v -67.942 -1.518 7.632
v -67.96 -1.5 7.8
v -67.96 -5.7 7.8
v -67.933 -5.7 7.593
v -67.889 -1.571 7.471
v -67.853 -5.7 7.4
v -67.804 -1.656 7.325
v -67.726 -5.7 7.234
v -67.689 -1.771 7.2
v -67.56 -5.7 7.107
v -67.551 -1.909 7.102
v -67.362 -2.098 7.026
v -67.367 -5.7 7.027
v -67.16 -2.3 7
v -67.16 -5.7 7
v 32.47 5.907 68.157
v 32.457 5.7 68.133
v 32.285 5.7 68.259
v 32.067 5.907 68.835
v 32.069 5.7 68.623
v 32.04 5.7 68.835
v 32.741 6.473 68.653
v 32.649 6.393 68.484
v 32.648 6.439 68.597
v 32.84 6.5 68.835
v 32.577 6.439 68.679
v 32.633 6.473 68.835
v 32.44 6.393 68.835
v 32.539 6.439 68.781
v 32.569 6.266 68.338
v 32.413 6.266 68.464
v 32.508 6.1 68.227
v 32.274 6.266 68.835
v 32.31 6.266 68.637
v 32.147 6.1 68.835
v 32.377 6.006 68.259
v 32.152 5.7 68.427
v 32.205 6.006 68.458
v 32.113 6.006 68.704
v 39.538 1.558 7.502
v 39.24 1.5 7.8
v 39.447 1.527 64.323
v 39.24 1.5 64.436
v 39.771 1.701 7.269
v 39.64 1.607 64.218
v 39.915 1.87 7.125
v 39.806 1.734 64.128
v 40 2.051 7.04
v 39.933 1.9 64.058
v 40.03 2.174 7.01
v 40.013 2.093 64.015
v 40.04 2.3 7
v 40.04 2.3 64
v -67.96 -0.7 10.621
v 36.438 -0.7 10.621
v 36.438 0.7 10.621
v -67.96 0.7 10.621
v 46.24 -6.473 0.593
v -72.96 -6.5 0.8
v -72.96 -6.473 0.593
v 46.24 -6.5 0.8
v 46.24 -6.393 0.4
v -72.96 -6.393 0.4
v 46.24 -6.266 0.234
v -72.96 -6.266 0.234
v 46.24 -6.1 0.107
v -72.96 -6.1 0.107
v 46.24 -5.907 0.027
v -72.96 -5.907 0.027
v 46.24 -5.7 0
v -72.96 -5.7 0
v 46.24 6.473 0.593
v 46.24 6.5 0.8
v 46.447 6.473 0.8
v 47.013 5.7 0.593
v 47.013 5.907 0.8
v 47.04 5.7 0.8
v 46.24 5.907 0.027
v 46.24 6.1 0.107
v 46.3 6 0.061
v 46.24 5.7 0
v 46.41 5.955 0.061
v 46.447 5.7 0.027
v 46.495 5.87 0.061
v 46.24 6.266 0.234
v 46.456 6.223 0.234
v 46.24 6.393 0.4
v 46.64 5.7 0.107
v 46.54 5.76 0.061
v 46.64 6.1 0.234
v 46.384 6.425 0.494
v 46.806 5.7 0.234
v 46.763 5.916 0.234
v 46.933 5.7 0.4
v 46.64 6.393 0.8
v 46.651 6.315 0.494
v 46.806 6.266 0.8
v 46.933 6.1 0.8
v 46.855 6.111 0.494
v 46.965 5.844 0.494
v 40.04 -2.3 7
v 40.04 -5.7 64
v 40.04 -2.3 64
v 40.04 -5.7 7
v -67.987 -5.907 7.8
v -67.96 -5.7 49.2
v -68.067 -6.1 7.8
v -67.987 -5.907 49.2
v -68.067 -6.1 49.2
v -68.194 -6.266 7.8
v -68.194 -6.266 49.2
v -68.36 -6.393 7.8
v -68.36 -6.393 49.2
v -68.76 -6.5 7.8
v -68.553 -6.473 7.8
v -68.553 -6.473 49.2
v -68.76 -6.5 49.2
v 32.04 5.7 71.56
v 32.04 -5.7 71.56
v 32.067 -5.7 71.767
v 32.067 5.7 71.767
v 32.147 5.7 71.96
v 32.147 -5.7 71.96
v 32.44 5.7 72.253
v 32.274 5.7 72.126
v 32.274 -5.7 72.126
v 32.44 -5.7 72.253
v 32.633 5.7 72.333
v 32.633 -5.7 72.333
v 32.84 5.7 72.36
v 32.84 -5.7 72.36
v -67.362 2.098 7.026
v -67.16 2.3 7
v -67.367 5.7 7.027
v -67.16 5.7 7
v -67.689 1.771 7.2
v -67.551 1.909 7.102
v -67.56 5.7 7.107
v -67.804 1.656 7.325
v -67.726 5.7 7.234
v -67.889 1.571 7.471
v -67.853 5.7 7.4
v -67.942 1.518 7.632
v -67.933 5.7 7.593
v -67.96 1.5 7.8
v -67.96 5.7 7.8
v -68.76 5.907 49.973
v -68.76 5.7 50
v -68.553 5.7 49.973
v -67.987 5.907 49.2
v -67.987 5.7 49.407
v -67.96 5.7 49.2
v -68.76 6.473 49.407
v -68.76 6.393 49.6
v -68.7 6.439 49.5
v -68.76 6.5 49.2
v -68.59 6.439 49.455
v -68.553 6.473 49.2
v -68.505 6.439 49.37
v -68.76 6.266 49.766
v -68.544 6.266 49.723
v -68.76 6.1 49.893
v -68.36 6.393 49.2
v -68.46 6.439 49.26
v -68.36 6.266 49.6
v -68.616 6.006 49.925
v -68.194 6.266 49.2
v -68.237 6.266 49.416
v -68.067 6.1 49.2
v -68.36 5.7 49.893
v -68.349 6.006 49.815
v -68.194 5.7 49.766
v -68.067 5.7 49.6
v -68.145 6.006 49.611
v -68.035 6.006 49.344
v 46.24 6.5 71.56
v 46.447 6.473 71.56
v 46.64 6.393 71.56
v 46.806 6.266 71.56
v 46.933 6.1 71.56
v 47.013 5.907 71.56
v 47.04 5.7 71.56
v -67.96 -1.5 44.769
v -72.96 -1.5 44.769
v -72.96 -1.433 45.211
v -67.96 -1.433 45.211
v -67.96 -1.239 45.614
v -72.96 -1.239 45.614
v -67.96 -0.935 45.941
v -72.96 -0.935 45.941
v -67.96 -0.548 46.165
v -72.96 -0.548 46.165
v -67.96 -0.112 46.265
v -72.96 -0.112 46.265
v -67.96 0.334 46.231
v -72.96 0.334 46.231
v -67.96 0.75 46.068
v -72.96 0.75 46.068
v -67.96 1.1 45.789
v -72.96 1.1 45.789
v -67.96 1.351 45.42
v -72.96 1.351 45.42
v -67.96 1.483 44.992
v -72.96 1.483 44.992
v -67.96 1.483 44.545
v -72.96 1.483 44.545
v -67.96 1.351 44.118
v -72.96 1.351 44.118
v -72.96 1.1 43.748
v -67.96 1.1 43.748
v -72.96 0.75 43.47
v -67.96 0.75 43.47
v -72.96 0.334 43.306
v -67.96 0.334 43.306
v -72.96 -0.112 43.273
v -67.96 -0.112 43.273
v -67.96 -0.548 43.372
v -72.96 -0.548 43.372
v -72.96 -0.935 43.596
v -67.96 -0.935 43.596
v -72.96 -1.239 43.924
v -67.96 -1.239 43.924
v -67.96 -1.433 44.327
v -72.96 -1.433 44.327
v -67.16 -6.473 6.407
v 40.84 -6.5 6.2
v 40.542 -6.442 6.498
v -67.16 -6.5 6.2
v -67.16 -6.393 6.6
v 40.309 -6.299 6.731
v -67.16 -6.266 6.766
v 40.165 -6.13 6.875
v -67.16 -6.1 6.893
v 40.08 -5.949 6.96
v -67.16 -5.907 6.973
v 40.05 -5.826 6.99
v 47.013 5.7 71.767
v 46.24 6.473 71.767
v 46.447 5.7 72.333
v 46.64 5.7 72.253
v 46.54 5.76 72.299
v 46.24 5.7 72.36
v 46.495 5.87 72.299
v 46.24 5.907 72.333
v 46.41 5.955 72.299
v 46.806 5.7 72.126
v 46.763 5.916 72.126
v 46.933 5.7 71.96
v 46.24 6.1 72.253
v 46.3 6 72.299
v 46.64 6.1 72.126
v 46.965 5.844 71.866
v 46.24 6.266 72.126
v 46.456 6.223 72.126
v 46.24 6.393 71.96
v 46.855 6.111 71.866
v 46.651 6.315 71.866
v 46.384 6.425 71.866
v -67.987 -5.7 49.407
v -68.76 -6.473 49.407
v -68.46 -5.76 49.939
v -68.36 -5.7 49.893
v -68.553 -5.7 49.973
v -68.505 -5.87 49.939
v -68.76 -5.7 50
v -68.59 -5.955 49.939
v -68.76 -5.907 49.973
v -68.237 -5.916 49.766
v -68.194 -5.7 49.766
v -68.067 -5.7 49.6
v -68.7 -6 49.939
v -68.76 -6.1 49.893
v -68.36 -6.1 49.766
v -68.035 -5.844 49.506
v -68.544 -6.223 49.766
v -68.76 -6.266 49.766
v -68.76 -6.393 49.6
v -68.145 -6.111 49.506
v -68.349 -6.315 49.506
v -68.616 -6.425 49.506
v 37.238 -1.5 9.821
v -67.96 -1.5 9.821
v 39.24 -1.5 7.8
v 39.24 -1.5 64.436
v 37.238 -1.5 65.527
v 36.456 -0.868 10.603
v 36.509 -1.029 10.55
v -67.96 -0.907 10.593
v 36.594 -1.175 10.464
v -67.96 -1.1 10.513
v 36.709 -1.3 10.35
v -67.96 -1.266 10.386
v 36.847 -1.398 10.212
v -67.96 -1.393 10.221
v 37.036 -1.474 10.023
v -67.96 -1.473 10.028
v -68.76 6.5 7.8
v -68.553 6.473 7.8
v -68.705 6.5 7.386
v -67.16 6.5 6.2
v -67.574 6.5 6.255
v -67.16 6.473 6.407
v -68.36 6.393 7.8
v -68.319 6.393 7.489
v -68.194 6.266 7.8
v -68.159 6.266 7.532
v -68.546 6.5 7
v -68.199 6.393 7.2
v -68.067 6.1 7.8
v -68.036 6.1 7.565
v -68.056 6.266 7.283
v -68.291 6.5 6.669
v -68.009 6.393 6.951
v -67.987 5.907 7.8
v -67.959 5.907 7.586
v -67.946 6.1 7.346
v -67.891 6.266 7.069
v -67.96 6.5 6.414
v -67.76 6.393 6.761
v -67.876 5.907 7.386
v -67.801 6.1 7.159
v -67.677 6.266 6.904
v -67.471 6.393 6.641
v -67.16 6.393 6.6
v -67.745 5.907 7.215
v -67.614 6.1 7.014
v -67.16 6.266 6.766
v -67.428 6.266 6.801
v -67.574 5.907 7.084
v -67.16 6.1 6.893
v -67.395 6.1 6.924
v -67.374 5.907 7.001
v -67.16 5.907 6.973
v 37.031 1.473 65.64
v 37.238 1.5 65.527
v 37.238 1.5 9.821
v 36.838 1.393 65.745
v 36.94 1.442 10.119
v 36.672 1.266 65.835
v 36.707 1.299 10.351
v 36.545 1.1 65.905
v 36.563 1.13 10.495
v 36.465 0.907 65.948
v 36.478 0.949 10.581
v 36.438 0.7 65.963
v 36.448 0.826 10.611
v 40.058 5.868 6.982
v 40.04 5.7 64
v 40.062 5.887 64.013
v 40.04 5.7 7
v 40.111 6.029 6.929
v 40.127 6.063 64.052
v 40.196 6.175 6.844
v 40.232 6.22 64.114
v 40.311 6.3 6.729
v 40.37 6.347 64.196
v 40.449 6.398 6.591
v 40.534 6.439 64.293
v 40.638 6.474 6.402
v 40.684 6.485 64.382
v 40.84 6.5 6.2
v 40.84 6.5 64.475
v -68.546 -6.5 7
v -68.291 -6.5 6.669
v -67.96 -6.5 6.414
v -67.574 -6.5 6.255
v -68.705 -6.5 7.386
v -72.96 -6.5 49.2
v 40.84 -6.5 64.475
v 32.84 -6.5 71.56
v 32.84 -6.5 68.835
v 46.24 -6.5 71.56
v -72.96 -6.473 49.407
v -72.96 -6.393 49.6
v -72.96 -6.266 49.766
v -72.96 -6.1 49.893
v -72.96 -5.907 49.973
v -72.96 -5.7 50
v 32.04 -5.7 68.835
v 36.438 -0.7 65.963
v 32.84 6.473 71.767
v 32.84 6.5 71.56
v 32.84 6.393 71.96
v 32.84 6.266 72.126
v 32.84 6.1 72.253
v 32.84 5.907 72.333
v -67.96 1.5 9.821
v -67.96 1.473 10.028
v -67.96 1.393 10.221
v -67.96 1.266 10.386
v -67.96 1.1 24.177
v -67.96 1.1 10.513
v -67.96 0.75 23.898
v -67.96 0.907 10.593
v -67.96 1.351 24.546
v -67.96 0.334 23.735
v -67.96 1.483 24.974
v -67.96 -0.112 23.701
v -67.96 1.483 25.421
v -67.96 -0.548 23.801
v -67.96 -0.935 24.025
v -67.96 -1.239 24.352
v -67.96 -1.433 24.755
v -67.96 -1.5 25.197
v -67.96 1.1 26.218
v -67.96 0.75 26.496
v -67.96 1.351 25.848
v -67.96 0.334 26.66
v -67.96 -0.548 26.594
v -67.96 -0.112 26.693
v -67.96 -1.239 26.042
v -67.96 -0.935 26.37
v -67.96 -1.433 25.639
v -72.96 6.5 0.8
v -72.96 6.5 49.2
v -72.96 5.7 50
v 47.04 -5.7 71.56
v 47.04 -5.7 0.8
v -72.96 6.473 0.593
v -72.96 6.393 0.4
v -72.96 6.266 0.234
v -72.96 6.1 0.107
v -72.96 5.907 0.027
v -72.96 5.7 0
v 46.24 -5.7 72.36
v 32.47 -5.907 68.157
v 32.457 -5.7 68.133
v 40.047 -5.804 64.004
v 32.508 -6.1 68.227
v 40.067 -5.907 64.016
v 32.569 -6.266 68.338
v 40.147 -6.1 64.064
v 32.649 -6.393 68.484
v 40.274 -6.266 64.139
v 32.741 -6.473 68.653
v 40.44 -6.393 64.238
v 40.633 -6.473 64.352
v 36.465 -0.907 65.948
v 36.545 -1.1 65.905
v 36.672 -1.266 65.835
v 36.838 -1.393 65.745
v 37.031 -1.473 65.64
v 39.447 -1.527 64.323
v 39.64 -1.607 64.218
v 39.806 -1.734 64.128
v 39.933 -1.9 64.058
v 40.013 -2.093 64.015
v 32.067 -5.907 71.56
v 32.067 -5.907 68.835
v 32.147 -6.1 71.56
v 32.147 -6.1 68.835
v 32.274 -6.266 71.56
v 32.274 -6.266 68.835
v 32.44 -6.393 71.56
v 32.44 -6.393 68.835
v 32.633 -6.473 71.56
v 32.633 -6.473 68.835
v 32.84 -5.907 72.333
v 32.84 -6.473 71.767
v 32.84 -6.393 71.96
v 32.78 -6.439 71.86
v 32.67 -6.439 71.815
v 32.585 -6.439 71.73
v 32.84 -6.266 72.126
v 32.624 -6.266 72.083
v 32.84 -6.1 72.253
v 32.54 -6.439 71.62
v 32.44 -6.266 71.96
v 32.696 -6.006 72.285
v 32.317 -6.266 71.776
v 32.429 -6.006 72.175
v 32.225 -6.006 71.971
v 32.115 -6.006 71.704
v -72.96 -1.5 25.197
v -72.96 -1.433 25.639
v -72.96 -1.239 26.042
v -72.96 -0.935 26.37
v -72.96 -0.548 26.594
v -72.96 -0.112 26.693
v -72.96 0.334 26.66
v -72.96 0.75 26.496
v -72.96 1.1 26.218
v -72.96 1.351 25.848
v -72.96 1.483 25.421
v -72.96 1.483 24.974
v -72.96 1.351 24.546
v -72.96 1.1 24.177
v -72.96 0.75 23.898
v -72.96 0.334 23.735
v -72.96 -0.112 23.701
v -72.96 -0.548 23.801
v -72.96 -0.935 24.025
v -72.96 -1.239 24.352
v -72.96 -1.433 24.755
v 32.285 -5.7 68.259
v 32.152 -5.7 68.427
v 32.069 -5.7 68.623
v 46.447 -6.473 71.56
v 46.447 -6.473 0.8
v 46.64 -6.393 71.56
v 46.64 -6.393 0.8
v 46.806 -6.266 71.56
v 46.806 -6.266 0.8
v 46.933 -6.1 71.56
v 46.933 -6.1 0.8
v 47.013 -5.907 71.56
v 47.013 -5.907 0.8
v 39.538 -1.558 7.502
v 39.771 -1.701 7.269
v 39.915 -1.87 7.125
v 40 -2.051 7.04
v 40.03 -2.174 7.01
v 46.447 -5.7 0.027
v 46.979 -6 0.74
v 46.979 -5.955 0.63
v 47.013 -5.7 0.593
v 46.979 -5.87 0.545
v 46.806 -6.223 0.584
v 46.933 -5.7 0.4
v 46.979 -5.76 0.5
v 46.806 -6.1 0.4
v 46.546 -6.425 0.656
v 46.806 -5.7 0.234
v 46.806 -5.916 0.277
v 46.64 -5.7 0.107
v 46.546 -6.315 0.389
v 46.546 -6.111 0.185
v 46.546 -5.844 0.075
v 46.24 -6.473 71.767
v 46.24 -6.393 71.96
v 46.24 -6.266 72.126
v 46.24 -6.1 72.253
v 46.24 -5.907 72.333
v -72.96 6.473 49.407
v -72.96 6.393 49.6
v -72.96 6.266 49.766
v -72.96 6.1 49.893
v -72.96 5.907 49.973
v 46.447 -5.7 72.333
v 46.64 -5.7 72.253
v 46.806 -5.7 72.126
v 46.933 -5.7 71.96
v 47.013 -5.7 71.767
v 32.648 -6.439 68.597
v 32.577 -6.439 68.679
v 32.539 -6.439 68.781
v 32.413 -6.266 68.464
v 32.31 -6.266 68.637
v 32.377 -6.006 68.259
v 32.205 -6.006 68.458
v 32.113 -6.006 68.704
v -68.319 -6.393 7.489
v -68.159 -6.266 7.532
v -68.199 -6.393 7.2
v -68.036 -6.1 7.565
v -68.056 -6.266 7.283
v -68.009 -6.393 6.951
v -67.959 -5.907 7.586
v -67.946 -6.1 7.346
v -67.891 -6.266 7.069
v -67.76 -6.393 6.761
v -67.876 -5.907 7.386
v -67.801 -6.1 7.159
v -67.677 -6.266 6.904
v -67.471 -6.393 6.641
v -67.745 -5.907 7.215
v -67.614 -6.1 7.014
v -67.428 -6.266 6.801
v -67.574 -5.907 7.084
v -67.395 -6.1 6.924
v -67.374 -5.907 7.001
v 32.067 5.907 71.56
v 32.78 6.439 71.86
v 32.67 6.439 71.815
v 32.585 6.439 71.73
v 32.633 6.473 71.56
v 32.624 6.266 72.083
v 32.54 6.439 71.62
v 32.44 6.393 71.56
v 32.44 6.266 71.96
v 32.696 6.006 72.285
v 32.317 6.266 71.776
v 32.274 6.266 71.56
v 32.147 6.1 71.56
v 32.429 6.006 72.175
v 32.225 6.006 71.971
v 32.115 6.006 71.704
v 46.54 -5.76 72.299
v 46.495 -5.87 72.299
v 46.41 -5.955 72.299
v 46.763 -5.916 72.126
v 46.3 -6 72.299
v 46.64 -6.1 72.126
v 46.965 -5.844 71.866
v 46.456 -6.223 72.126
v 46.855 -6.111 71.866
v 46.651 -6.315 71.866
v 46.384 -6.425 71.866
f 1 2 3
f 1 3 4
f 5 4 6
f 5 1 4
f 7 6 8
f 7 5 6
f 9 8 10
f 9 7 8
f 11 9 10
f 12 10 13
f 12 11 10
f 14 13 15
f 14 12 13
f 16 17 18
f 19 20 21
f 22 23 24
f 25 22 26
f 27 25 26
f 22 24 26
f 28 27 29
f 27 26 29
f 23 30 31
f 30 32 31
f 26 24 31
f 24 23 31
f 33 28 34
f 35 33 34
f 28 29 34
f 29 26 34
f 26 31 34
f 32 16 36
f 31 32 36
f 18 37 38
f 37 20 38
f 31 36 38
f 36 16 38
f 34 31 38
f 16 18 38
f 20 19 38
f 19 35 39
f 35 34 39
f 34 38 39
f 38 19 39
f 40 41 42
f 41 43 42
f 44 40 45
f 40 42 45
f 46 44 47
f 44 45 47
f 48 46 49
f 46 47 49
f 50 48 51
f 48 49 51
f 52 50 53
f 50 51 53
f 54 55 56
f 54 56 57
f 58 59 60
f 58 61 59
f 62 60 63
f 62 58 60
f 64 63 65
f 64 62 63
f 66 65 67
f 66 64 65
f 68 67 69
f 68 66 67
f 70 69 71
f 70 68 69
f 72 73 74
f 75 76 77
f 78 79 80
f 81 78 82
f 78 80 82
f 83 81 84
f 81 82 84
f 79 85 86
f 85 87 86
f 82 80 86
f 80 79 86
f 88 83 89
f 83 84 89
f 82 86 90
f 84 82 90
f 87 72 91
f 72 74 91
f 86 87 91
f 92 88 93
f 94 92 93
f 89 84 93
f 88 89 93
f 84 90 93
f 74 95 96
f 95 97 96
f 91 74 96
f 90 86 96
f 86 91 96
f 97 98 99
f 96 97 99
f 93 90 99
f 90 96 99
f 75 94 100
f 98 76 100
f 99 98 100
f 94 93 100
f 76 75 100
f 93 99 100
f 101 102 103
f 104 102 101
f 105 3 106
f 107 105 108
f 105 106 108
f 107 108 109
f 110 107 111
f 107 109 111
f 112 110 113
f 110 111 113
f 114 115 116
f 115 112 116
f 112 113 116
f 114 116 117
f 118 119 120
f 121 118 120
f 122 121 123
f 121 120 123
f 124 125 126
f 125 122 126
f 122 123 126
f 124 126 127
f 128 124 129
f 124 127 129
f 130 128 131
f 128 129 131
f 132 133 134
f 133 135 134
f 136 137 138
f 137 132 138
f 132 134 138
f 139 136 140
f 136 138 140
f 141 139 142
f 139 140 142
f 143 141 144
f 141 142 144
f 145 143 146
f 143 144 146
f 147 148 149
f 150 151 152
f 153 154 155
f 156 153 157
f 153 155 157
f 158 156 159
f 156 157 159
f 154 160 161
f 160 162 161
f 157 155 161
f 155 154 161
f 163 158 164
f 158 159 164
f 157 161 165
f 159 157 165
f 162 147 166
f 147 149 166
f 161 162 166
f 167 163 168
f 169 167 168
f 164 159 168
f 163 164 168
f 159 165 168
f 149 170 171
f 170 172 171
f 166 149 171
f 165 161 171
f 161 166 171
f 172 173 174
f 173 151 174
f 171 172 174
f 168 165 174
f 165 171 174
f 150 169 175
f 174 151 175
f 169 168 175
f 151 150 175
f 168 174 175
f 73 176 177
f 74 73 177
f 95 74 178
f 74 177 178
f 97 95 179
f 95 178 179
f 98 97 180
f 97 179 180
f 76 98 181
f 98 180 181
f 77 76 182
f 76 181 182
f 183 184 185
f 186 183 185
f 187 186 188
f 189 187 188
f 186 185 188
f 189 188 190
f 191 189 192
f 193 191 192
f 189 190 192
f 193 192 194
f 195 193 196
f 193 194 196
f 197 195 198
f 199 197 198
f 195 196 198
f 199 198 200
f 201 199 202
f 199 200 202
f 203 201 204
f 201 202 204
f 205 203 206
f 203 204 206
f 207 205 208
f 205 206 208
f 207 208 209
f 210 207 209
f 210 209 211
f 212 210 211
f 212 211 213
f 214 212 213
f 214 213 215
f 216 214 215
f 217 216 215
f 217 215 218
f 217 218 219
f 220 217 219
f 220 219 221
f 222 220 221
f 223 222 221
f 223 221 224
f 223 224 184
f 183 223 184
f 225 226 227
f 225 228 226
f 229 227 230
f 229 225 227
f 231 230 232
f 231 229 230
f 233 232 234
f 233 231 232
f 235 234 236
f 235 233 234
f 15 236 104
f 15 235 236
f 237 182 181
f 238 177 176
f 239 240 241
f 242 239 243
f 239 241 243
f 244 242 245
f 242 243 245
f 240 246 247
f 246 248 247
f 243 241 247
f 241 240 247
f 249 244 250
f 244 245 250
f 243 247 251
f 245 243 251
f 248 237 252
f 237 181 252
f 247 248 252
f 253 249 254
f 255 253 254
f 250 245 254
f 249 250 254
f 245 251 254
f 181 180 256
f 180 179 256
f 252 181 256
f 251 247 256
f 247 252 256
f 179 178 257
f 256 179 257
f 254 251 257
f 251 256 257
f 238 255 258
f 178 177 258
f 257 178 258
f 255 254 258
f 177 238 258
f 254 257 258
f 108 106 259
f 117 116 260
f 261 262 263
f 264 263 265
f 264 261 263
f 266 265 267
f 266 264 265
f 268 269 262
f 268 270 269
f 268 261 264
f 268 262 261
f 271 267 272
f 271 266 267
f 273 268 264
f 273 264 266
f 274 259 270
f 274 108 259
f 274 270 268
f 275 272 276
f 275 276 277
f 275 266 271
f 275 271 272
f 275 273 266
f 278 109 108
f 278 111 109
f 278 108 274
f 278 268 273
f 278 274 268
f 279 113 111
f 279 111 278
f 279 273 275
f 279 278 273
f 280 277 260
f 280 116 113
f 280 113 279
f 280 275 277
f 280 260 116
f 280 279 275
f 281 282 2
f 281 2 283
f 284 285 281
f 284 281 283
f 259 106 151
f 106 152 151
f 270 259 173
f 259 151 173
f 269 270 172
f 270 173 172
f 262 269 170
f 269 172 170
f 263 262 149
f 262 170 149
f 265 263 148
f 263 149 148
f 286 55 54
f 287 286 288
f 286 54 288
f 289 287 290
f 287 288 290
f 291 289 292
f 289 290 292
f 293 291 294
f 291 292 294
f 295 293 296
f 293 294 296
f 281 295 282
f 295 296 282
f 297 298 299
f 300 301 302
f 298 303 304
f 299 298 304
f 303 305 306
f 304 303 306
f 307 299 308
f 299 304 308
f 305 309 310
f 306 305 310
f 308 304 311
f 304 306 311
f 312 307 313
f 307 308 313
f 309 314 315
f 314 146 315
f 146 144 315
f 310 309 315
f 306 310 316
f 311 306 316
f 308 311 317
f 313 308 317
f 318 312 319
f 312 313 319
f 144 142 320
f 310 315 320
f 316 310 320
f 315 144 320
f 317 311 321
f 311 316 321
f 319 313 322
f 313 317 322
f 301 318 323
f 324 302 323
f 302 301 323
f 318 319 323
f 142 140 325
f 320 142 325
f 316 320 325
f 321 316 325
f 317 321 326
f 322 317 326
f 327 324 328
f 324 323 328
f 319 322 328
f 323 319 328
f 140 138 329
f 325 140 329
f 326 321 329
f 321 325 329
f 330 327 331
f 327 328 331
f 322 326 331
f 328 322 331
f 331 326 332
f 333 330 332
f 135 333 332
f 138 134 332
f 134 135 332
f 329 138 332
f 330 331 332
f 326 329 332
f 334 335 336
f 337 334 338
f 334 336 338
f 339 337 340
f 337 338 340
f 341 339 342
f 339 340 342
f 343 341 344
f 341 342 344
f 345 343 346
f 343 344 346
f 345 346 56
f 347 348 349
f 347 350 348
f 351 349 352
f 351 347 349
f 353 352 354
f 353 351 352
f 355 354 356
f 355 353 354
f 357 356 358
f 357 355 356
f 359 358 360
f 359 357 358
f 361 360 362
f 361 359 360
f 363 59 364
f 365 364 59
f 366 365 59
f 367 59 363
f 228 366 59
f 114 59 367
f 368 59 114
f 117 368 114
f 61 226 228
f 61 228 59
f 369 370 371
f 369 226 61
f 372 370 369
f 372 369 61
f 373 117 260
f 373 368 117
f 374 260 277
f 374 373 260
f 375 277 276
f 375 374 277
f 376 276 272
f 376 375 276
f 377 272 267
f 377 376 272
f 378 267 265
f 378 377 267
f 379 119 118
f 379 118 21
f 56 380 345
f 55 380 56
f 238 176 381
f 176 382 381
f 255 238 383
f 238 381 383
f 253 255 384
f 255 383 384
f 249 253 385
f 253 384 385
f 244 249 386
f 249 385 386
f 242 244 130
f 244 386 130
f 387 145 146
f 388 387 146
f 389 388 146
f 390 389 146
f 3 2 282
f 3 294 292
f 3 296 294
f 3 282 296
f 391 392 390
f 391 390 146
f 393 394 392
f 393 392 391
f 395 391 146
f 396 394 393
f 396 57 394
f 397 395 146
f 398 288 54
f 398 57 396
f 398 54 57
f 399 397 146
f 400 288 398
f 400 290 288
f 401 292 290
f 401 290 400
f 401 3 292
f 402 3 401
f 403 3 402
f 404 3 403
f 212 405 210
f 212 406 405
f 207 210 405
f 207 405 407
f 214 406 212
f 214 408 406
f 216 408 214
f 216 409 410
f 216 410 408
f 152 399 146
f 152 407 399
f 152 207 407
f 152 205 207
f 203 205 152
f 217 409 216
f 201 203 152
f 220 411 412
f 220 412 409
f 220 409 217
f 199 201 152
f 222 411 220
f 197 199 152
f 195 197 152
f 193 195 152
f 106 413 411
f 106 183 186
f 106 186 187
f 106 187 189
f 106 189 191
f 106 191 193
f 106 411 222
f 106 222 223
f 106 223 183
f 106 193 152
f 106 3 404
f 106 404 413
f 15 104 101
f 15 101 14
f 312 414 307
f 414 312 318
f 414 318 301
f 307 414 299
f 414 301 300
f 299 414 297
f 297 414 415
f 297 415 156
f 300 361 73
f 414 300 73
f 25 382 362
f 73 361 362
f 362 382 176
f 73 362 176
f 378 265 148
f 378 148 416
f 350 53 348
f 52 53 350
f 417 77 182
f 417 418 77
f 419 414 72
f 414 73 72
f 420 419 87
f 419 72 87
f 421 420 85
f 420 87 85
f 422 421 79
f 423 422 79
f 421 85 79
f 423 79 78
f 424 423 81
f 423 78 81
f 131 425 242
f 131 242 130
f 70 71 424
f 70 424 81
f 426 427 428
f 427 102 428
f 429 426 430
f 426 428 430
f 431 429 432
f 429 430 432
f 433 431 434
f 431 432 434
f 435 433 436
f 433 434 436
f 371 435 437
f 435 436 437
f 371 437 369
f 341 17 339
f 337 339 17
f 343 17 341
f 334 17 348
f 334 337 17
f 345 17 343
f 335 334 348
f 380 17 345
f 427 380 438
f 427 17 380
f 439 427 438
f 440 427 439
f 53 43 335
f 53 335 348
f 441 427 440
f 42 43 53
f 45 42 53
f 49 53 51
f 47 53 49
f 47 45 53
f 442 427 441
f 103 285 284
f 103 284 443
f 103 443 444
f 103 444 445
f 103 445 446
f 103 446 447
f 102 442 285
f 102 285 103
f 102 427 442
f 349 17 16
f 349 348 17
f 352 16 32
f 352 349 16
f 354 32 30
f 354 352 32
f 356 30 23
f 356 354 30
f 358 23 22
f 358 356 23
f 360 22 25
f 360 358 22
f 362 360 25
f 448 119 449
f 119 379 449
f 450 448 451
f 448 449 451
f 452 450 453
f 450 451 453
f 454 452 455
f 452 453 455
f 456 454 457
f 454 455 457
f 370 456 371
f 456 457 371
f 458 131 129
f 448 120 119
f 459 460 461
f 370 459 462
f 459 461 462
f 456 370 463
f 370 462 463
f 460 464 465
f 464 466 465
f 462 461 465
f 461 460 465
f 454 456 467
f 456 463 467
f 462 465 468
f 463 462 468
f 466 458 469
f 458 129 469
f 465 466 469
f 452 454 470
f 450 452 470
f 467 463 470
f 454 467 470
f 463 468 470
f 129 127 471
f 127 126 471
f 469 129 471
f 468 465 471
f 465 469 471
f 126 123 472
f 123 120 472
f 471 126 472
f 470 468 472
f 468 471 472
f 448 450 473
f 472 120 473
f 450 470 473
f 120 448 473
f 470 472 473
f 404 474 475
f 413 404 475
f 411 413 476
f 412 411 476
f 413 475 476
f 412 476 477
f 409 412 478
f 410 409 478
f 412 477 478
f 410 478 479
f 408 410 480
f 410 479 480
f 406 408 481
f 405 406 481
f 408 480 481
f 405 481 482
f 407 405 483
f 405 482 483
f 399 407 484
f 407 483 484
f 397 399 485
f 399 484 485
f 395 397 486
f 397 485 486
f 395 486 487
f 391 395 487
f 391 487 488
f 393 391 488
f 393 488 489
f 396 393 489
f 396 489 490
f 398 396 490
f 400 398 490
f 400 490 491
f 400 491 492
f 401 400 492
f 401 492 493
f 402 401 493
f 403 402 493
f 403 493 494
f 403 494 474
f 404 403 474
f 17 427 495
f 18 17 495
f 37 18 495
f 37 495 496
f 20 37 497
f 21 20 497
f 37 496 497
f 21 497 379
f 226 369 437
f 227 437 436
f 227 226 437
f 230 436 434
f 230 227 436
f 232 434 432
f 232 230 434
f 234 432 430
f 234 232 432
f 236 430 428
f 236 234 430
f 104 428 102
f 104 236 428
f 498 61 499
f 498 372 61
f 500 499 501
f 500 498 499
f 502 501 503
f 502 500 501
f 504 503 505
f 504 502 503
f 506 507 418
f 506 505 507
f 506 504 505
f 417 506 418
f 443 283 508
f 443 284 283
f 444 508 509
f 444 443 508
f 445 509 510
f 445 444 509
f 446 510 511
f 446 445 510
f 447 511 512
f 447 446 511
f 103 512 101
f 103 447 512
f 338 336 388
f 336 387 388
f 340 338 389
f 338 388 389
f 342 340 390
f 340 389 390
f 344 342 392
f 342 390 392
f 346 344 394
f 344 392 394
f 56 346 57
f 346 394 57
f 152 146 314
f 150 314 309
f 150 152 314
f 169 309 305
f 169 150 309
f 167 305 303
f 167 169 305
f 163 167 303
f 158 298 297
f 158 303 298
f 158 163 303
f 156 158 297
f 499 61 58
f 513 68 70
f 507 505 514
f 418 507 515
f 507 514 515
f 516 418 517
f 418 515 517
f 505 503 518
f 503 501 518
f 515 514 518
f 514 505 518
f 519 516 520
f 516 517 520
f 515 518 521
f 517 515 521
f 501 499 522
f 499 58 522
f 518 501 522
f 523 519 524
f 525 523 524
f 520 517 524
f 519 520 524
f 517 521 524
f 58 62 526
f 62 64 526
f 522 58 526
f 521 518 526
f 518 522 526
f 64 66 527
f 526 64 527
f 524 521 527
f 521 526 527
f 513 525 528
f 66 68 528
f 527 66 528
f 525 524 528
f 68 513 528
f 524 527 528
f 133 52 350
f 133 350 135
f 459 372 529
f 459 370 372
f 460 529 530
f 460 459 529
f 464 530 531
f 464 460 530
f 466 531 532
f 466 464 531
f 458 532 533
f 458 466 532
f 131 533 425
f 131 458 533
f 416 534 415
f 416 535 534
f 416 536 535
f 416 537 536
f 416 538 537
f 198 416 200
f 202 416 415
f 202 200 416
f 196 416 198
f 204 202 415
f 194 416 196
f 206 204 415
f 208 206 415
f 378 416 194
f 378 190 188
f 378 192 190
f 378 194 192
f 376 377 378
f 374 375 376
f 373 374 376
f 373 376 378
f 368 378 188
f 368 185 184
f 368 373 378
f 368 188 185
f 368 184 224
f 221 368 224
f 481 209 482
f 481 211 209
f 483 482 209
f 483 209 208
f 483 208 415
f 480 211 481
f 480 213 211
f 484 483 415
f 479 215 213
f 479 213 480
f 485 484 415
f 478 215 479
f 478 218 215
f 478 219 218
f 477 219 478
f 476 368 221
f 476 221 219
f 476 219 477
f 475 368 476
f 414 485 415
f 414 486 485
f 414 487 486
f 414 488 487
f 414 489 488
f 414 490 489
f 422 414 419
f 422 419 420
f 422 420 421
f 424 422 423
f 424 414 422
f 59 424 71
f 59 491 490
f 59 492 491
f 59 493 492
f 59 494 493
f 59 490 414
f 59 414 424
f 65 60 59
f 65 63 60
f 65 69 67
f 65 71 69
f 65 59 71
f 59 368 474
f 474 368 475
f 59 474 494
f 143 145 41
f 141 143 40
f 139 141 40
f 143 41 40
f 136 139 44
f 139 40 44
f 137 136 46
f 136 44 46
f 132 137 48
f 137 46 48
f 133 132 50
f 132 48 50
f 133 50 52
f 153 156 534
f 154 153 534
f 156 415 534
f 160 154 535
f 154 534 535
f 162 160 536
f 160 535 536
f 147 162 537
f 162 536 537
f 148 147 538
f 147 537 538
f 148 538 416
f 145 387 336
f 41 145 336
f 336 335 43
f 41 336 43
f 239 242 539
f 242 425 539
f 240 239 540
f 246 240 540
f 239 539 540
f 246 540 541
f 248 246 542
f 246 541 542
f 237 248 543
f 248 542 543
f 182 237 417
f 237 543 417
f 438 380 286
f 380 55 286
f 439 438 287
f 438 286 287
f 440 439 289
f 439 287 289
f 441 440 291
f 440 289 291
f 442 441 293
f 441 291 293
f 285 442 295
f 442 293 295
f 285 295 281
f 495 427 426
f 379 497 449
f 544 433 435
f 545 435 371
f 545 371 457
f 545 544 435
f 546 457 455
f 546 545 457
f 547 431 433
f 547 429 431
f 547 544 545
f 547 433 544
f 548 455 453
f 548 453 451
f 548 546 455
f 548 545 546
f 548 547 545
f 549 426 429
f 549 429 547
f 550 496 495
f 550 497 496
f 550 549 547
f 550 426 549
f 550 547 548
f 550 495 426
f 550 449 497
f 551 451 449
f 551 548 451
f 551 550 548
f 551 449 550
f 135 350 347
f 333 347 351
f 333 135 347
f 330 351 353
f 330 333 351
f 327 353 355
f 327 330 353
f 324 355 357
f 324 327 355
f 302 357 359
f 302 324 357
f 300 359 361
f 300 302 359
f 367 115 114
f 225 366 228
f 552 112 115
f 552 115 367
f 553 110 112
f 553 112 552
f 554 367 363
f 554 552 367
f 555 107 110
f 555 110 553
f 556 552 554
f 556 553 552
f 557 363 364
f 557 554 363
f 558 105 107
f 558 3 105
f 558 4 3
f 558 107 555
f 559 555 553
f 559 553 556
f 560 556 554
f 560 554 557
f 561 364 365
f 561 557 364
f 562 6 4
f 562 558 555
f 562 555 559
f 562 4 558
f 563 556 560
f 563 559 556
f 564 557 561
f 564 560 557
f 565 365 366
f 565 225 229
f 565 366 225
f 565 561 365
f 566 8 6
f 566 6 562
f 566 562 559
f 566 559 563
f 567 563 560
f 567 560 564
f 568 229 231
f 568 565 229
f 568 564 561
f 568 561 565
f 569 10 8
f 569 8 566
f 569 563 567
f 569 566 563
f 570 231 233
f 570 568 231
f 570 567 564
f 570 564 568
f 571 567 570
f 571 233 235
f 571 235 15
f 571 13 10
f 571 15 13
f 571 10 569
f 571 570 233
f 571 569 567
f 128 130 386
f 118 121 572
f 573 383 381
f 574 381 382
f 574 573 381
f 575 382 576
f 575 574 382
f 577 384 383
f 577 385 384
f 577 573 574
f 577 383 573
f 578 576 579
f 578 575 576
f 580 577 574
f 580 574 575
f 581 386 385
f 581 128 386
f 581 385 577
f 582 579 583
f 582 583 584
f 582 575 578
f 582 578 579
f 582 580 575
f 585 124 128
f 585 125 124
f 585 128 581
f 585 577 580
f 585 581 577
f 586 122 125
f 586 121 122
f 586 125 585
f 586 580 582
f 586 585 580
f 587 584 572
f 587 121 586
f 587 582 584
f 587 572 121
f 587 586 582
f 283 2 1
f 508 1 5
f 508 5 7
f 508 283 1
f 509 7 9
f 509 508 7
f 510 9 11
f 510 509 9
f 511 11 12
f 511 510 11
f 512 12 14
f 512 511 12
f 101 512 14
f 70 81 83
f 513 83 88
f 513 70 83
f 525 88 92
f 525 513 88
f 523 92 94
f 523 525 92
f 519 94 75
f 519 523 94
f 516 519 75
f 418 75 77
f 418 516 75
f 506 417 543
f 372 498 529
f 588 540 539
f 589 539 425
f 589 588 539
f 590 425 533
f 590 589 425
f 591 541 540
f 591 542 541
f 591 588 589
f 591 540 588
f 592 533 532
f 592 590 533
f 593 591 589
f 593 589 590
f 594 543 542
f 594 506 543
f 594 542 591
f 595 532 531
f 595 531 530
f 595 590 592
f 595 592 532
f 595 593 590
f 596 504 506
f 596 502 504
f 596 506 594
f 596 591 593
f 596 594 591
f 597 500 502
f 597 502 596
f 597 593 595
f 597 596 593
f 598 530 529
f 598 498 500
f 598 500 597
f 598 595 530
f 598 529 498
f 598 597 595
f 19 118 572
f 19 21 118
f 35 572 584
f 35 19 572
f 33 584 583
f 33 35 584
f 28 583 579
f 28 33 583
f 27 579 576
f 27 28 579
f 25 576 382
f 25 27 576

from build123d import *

# Parameters (mm, degrees)
F1_DEPTH = 6.5
F2_R     = 1.5
F3_DEPTH = 25
F5_DEPTH = 1.5
F6_R     = 0.8


with BuildPart() as f1:
    # F0 (on Front) → F1 (new body, symmetric)
    with BuildSketch(Plane.XZ):
        Polygon((-72.959999821, 50), (-72.959999821, 0), (47.040000179, 0), (47.040000179, 72.3599994255), (32.040000179, 72.3599994255), (32.040000179, 68.3599994255), (40.040000179, 64), (40.040000179, 7), (-67.959999821, 7), (-67.959999821, 50), align=None)
    extrude(amount=F1_DEPTH, both=True)

    # F2 (on face) → F3 (cut)
    with BuildSketch(Plane(origin=(-72.959999821, 0, 0), x_dir=(0, -1, 0), z_dir=(-1, 0, 0))):
        with Locations((0, 25.1972917467)):
            Circle(F2_R)
        with Locations((0, 44.7687469423)):
            Circle(F2_R)
    extrude(amount=-F3_DEPTH, mode=Mode.SUBTRACT)

    # F4 (on Front) → F5 (join, symmetric)
    with BuildSketch(Plane.XZ):
        Polygon((-71.5028345585, 10.6206643313), (-71.5028345585, 7.5510139577), (-71.5028345585, 5.6206643313), (41.4378745708, 5.6206643313), (41.4378745708, 70.8550155432), (36.4378745708, 70.8550155432), (36.4378745708, 10.6206643313), align=None)
    extrude(amount=F5_DEPTH, both=True)

    # F6
    f6_edges = [f1.edges().sort_by_distance(p)[0] for p in [
        (-67.96, -6.5, 28.5),
        (-67.96, 0, 50),
        (-70.46, 6.5, 50),
        (-70.46, -6.5, 50),
        (-67.96, 6.5, 28.5),
        (-13.96, 6.5, 7),
        (-15.761063, 1.5, 10.620664),
        (-15.761063, -1.5, 10.620664),
        (-13.96, -6.5, 7),
        (40.04, -6.5, 35.5),
        (36.437875, -1.5, 38.291911),
        (36.437875, 1.5, 38.291911),
        (40.04, 6.5, 35.5),
        (47.04, 6.5, 36.18),
        (-12.96, 6.5, 0),
        (-12.96, -6.5, 0),
        (47.04, -6.5, 36.18),
        (47.04, 0, 72.359999),
        (32.04, 0, 72.359999),
        (39.54, 6.5, 72.359999),
        (39.54, -6.5, 72.359999),
        (32.04, 0, 68.359999),
        (36.04, -6.5, 66.18),
        (36.04, 6.5, 66.18),
        (40.04, 1.5, 35.5),
        (40.04, -1.5, 35.5),
        (32.04, -6.5, 70.359999),
        (32.04, 6.5, 70.359999),
        (-13.96, -1.5, 7),
        (-13.96, 1.5, 7),
        (47.04, 0, 0),
        (-67.96, -4, 7),
        (-67.96, 4, 7),
    ]]
    fillet(f6_edges, radius=F6_R)


solid = f1.part
